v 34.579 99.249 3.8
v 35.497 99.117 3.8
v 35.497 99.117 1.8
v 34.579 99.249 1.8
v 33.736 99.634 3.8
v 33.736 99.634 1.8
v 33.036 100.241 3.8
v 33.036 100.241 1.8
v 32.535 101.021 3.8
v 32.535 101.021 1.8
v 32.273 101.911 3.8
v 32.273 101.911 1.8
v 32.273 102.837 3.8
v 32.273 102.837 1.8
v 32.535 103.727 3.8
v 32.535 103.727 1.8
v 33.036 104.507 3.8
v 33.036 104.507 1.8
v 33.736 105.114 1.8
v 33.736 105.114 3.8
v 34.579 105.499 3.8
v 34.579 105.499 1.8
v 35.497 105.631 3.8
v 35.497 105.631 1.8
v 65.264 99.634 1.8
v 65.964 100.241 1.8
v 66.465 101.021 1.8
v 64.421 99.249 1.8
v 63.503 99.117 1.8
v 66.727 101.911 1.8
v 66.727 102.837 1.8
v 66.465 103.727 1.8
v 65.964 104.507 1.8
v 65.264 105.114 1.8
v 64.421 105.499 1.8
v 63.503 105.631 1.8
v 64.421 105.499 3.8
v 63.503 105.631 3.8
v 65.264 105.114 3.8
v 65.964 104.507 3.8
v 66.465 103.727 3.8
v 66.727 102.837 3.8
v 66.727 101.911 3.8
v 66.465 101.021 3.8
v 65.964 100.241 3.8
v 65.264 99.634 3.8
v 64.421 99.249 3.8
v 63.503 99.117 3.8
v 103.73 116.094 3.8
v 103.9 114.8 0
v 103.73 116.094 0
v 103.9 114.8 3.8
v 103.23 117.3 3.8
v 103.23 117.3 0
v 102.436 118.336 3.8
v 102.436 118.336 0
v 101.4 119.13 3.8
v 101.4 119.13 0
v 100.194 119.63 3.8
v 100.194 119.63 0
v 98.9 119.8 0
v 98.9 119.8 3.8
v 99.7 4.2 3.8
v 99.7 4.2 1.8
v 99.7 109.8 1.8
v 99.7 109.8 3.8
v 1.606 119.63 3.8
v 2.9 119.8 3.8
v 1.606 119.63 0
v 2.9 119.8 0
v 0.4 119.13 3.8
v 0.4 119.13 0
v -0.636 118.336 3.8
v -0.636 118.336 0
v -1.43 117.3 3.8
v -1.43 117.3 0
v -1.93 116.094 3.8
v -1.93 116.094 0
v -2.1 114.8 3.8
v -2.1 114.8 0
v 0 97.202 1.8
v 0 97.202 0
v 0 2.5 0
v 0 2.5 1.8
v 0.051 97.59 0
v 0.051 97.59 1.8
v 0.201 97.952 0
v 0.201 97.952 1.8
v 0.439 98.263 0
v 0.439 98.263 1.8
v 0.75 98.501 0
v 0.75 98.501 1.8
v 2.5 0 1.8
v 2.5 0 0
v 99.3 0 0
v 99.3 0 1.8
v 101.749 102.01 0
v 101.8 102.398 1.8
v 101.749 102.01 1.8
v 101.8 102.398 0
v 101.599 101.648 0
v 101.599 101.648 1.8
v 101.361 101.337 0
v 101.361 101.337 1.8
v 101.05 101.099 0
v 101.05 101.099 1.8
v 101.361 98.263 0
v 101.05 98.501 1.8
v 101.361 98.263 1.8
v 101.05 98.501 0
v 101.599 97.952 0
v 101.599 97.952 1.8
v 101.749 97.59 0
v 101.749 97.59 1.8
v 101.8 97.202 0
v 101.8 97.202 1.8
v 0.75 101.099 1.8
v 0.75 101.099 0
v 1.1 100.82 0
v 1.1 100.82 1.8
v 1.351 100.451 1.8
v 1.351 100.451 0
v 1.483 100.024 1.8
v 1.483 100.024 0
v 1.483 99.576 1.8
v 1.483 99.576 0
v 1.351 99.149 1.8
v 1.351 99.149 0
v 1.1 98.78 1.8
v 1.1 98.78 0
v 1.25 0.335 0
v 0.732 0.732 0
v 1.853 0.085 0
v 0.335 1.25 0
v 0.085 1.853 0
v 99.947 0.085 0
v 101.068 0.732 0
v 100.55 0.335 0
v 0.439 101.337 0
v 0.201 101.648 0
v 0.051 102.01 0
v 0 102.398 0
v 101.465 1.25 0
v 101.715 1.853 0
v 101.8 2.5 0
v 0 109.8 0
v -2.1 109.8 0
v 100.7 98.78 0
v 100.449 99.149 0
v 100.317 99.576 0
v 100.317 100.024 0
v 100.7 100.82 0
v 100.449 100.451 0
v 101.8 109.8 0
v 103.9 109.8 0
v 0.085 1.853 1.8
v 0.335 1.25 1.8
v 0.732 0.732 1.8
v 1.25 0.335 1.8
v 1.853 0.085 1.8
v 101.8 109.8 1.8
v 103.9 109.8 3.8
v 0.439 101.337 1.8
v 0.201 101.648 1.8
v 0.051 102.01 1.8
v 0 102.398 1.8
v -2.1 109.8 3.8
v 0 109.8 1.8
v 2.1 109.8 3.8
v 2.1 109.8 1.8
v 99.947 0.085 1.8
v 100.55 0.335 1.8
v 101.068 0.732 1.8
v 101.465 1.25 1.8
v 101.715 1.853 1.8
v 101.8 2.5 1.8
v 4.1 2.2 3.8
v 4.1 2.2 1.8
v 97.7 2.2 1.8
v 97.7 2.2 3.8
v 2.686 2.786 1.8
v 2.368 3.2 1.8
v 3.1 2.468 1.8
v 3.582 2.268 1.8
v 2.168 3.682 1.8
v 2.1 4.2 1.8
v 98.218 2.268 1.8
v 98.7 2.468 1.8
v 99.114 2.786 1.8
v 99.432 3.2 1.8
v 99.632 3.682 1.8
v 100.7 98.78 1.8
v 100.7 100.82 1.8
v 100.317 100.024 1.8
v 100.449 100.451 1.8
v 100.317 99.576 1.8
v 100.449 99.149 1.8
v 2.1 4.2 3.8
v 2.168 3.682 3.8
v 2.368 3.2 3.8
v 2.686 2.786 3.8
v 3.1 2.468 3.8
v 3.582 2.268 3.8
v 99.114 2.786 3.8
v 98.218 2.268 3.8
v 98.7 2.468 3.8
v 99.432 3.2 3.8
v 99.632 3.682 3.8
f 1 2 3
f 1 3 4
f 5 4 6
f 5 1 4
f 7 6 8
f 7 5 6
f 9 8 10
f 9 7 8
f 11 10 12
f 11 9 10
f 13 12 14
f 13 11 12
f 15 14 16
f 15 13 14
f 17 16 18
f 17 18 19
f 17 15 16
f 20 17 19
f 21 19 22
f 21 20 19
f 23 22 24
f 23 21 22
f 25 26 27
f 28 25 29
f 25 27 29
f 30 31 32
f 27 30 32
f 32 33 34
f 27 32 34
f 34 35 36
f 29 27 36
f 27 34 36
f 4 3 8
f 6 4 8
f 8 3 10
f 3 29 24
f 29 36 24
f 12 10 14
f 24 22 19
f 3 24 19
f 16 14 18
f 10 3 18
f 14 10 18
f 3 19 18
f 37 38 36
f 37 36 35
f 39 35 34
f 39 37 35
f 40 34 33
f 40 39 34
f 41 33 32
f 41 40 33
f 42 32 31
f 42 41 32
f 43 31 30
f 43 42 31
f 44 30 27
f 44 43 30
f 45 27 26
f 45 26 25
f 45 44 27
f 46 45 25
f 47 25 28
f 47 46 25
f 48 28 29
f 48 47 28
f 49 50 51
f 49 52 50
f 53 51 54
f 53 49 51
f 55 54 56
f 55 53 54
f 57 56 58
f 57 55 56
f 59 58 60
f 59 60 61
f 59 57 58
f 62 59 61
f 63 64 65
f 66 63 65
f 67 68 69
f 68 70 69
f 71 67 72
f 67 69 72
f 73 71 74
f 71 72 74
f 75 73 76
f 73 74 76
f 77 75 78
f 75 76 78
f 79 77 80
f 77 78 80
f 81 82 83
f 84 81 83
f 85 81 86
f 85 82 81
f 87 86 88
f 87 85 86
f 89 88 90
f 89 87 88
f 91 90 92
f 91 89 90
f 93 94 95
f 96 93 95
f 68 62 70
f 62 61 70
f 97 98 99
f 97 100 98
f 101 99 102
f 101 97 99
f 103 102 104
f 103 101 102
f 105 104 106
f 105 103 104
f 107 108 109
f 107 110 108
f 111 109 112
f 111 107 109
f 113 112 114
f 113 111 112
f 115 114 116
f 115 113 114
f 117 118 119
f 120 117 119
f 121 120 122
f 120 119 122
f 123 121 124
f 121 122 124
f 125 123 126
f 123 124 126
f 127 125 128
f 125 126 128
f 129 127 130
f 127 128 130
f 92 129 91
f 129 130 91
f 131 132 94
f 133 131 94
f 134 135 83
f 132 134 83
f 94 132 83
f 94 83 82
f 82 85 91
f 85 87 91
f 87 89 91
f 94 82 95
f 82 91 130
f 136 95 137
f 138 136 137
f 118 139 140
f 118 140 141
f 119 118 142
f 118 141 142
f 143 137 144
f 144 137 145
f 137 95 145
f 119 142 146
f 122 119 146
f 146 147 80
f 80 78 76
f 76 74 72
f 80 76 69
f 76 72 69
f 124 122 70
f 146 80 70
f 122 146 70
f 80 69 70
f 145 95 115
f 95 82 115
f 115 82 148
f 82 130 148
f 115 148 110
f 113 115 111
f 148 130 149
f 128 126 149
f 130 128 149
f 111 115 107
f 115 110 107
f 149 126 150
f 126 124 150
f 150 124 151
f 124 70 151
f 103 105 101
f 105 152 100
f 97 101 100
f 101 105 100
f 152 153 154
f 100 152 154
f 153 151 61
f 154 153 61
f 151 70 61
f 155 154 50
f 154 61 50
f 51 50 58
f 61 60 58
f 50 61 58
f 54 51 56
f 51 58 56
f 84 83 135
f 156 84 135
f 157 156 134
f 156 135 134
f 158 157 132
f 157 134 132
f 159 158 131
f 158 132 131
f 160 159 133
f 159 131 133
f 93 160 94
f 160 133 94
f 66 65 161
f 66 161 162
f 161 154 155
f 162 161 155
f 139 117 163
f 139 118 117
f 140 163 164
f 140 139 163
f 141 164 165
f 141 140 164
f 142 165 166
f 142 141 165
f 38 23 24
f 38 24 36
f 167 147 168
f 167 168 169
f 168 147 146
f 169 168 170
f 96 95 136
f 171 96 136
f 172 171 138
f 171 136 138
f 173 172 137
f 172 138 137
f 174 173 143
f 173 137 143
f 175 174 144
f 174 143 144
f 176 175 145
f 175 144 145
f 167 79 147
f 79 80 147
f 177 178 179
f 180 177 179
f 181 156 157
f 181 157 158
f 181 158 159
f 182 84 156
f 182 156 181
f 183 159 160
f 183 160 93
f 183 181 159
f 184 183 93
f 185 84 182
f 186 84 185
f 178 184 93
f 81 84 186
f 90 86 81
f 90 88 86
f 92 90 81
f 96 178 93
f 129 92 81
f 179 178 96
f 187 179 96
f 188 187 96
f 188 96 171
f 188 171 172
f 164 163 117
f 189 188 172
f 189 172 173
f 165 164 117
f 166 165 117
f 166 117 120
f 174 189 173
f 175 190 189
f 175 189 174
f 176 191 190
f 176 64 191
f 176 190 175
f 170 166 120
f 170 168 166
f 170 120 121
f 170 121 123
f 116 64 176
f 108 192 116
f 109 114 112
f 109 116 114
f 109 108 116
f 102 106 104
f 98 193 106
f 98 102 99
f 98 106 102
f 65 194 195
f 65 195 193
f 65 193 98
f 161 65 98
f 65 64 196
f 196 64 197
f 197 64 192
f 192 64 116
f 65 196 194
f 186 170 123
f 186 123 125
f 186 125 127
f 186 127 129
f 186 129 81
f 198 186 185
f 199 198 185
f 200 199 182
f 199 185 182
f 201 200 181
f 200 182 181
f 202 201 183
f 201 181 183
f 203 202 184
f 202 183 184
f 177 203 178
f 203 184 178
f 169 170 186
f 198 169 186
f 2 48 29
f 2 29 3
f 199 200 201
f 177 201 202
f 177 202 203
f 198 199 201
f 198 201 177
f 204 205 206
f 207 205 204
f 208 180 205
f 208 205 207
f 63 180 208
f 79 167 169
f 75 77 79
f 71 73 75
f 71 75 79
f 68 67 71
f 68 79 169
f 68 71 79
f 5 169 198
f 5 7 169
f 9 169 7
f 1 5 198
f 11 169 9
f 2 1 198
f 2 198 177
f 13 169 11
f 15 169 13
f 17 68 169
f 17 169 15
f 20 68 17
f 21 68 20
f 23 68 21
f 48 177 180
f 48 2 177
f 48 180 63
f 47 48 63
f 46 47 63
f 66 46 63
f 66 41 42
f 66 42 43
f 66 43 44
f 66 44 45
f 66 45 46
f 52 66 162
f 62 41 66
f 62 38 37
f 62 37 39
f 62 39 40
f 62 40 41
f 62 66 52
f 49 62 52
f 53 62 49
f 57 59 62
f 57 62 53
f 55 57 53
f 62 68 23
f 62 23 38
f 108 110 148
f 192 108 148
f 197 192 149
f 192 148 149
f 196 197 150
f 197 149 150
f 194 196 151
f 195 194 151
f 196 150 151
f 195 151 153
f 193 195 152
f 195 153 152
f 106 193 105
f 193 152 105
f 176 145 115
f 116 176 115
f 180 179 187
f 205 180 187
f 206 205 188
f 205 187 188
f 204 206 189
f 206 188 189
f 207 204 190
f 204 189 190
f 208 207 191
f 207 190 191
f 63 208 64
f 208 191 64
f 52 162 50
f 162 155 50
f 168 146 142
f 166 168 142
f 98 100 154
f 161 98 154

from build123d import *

# Parameters (mm, degrees)
BOSS_EXTRUDE1_DEPTH = 1.8
BOSS_EXTRUDE2_DEPTH = 2
CUT_EXTRUDE1_DEPTH  = 2
SKETCH5_R           = 1.5
CUT_EXTRUDE2_DEPTH  = 1.8
FILLET3_R           = 1.5
FILLET4_R           = 5


with BuildPart() as part:
    # Sketch1 → Boss-Extrude1 (new body)
    with BuildSketch(Plane.XY):
        with BuildLine():
            Line((101.8, 109.8), (103.9, 109.8))
            Line((103.9, 109.8), (103.9, 119.8))
            Line((103.9, 119.8), (-2.1, 119.8))
            Line((-2.1, 119.8), (-2.1, 109.8))
            Line((-2.1, 109.8), (0, 109.8))
            Line((0, 109.8), (0, 2.5))
            ThreePointArc((0, 2.5), (0.732233047, 0.732233047), (2.5, 0))
            Line((2.5, 0), (99.3, 0))
            ThreePointArc((99.3, 0), (101.067766953, 0.732233047), (101.8, 2.5))
            Line((101.8, 2.5), (101.8, 109.8))
        make_face()
    extrude(amount=BOSS_EXTRUDE1_DEPTH)

    # Sketch2 → Boss-Extrude2 (add)
    with BuildSketch(Plane.XY.offset(1.8)):
        with BuildLine():
            Line((2.1, 109.8), (2.1, 4.2))
            ThreePointArc((2.1, 4.2), (2.685786438, 2.785786438), (4.1, 2.2))
            Line((4.1, 2.2), (97.7, 2.2))
            ThreePointArc((97.7, 2.2), (99.114213562, 2.785786438), (99.7, 4.2))
            Line((99.7, 4.2), (99.7, 109.8))
            Line((99.7, 109.8), (103.9, 109.8))
            Line((103.9, 109.8), (103.9, 119.8))
            Line((103.9, 119.8), (-2.1, 119.8))
            Line((-2.1, 119.8), (-2.1, 109.8))
            Line((-2.1, 109.8), (2.1, 109.8))
        make_face()
    extrude(amount=BOSS_EXTRUDE2_DEPTH)

    # Sketch3 → Cut-Extrude1 (cut)
    with BuildSketch(Plane.XY.offset(3.8)):
        with BuildLine():
            Line((35.496856475, 105.630553179), (63.503143525, 105.630553179))
            ThreePointArc((63.503143525, 105.630553179), (66.759688531, 102.374008173), (63.503143525, 99.117463168))
            Line((63.503143525, 99.117463168), (35.496856475, 99.117463168))
            ThreePointArc((35.496856475, 99.117463168), (32.240311469, 102.374008173), (35.496856475, 105.630553179))
        make_face()
    extrude(amount=-CUT_EXTRUDE1_DEPTH, mode=Mode.SUBTRACT)

    # Sketch5 → Cut-Extrude2 (cut)
    with BuildSketch(Plane(origin=(0, 0, 0), x_dir=(-1, 0, 0), z_dir=(0, 0, -1))):
        with Locations((-101.8, 99.8)):
            Circle(SKETCH5_R)
        with Locations((0, 99.8)):
            Circle(SKETCH5_R)
    extrude(amount=-CUT_EXTRUDE2_DEPTH, mode=Mode.SUBTRACT)

    # Fillet3
    fillet3_edges = [part.edges().sort_by_distance(p)[0] for p in [
        (101.8, 101.3, 0.9),
        (101.8, 98.3, 0.9),
        (0, 98.3, 0.9),
        (0, 101.3, 0.9),
    ]]
    fillet(fillet3_edges, radius=FILLET3_R)

    # Fillet4
    fillet4_edges = [part.edges().sort_by_distance(p)[0] for p in [
        (-2.1, 119.8, 1.9),
        (103.9, 119.8, 1.9),
    ]]
    fillet(fillet4_edges, radius=FILLET4_R)


solid = part.part
